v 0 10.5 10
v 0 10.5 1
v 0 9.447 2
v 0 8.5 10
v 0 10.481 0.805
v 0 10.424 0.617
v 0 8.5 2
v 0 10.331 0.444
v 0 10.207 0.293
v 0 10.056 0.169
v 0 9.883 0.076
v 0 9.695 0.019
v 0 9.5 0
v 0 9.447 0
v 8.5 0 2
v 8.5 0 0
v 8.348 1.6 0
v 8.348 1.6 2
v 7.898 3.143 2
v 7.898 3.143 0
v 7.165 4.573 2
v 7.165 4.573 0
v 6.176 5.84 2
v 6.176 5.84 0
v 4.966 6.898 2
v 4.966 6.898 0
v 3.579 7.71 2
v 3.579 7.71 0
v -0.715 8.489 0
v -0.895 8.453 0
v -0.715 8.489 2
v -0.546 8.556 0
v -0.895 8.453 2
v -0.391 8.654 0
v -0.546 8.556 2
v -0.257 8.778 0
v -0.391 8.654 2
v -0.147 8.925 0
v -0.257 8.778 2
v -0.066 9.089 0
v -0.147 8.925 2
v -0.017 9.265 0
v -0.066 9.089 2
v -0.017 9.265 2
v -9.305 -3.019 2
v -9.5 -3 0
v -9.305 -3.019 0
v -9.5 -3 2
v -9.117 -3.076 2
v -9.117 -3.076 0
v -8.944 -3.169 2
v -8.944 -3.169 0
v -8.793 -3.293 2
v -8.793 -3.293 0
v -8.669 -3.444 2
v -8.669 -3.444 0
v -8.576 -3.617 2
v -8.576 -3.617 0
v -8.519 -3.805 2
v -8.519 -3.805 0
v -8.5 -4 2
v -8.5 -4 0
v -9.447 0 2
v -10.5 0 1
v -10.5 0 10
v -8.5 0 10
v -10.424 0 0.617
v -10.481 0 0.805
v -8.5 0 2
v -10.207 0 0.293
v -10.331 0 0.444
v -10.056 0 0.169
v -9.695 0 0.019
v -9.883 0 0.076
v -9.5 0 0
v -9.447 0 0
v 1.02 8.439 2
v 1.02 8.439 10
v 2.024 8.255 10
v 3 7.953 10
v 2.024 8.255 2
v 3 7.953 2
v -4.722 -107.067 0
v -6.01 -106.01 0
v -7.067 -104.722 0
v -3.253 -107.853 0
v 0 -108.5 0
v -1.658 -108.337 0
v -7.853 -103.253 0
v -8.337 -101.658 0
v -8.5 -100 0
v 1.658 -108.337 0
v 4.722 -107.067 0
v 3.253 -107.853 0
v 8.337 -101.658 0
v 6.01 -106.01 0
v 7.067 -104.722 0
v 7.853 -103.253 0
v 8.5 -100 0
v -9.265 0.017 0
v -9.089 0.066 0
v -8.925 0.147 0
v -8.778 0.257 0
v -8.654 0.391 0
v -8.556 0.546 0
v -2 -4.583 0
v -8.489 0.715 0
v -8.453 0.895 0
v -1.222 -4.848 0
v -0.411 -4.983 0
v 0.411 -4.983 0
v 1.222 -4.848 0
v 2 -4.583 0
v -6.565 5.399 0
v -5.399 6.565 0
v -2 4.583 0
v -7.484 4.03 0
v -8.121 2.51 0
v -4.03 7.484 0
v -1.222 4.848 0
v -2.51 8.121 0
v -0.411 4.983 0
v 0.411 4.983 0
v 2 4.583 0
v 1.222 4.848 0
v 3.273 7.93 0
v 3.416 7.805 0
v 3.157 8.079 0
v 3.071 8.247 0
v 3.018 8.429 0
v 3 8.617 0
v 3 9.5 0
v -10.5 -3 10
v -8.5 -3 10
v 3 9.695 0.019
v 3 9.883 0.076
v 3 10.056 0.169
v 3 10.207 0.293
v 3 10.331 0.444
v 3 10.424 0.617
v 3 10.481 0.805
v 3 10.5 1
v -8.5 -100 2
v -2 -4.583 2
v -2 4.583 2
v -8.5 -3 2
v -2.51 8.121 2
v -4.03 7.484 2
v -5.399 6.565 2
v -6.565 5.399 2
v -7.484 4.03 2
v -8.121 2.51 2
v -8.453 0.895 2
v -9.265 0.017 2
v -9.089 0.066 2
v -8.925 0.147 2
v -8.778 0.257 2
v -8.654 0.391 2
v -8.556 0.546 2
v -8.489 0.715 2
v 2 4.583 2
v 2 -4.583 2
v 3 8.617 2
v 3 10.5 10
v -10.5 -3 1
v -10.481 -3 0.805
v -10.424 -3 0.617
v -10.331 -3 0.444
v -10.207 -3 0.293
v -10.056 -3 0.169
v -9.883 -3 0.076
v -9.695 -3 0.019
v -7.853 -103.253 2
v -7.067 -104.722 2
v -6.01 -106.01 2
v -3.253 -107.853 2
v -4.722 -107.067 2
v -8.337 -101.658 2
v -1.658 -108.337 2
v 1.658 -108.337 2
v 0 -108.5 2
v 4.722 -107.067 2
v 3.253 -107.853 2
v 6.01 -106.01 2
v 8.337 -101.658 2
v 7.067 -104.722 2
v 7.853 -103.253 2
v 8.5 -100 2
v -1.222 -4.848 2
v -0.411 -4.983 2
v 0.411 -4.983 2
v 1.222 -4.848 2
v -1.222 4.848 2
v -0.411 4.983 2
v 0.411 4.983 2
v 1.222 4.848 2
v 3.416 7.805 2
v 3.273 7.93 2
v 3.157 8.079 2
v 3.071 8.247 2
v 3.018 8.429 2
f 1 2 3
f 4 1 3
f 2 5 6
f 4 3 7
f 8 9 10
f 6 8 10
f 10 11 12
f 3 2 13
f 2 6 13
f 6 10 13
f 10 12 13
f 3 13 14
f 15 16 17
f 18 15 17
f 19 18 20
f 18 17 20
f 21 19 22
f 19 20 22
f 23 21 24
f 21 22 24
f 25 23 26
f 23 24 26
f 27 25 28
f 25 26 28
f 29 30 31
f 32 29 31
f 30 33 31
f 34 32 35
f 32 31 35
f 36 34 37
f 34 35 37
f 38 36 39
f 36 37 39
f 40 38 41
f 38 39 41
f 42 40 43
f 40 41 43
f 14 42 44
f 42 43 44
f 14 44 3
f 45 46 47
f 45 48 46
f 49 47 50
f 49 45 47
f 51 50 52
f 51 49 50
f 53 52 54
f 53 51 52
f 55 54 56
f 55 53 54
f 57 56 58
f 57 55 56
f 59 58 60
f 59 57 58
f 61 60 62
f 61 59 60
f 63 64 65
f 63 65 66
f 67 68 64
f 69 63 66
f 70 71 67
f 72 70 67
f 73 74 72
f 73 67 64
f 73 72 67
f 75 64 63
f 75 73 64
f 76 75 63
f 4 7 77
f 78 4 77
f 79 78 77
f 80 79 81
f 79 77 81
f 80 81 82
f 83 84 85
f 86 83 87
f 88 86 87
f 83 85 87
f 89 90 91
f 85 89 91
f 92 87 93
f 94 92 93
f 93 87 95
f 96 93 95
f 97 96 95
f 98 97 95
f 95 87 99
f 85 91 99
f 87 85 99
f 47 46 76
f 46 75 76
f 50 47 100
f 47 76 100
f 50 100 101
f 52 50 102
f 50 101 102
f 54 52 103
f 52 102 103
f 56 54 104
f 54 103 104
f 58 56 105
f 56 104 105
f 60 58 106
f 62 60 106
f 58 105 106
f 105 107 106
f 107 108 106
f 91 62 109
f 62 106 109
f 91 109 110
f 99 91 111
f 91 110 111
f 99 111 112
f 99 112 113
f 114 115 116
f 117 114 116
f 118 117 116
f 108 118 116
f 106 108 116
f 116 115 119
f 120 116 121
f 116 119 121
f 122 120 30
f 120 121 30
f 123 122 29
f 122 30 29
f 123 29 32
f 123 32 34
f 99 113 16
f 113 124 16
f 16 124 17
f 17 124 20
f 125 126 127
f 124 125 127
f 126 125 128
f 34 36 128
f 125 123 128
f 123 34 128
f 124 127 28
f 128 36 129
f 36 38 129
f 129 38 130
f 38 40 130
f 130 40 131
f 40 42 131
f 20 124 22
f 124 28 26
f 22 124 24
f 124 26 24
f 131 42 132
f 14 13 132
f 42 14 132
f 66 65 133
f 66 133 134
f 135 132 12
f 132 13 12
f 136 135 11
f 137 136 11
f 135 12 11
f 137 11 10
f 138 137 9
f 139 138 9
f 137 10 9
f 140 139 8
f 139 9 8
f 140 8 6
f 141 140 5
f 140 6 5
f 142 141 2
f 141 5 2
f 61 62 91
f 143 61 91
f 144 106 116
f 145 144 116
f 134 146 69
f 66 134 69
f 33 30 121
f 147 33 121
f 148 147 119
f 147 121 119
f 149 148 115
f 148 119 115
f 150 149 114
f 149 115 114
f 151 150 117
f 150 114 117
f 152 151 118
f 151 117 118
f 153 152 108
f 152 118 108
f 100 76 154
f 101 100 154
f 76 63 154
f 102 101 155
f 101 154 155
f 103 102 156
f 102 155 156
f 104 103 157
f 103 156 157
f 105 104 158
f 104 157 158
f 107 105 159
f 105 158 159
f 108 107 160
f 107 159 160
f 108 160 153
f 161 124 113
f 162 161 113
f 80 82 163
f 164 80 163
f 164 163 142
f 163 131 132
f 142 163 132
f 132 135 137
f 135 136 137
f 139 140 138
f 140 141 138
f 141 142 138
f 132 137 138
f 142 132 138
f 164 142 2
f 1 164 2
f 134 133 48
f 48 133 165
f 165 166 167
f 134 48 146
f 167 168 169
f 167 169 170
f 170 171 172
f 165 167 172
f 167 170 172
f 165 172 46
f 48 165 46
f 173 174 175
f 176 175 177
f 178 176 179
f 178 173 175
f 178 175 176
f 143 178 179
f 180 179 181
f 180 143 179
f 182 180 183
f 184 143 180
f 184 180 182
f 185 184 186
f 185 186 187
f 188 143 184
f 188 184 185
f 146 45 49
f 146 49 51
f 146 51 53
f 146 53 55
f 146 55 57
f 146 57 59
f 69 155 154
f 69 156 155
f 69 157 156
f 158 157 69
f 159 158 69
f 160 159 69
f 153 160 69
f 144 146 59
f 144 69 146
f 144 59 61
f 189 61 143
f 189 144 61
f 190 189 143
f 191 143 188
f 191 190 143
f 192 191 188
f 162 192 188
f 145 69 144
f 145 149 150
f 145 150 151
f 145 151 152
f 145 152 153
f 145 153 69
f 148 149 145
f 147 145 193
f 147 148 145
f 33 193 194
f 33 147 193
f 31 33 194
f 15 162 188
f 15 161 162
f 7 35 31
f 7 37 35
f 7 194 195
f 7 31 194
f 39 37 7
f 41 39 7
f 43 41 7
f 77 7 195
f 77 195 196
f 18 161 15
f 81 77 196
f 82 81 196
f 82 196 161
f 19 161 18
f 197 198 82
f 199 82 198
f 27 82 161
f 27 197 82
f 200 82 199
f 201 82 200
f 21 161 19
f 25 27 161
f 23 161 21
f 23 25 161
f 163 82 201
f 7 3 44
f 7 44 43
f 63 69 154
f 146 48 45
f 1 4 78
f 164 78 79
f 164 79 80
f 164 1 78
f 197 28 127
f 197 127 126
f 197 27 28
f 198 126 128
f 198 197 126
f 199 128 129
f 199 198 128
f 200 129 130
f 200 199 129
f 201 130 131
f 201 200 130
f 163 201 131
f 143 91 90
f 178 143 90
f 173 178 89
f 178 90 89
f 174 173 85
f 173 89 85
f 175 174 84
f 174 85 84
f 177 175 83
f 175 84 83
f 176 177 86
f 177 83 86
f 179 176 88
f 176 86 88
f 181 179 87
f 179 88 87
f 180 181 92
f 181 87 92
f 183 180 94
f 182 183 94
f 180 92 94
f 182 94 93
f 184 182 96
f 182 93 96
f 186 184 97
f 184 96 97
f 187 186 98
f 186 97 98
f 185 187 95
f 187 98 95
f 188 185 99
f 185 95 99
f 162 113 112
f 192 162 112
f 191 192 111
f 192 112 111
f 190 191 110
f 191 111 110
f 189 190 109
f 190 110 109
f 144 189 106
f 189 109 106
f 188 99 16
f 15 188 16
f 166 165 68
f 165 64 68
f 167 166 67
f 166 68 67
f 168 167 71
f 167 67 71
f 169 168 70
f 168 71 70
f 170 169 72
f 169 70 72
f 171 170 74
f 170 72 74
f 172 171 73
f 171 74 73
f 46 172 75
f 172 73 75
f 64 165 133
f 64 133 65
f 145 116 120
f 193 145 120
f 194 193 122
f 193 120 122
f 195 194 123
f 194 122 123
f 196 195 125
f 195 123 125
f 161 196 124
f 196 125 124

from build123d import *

# Parameters (mm, degrees)
F1_DEPTH = 2
F2_W     = 2
F2_H     = 3
F3_DEPTH = 10
F4_R     = 0.99999


# Not quite as in the source:
# - a fillet or chamfer is up to 0.001 mm smaller than in the source, because OpenCascade refuses the exact size


with BuildPart() as f1:
    # F0 (on Top) → F1 (new body)
    with BuildSketch(Plane.XY):
        with BuildLine():
            Line((8.5, -100), (8.5, 0))
            ThreePointArc((8.5, 0), (0, 8.5), (-8.5, 0))
            Line((-8.5, 0), (-8.5, -100))
            ThreePointArc((-8.5, -100), (0, -108.5), (8.5, -100))
        make_face()
        with BuildLine():
            ThreePointArc((-2, 4.582575695), (0, 5), (2, 4.582575695))
            Line((2, 4.582575695), (2, -4.582575695))
            ThreePointArc((2, -4.582575695), (0, -5), (-2, -4.582575695))
            Line((-2, -4.582575695), (-2, 4.582575695))
        make_face(mode=Mode.SUBTRACT)
    extrude(amount=F1_DEPTH)

    # F2 (on Top) → F3 (join)
    with BuildSketch(Plane.XY):
        with Locations((-9.5, -1.5)):
            Rectangle(F2_W, F2_H)
        with BuildLine():
            Line((0, 10.5), (0, 8.5))
            ThreePointArc((0, 8.5), (1.5247314005, 8.3621285661), (3, 7.9529868603))
            Line((3, 7.9529868603), (3, 10.5))
            Line((3, 10.5), (0, 10.5))
        make_face()
    extrude(amount=F3_DEPTH)

    # F4 (radius 1 in the source; OpenCascade refuses exactly that, so slightly less here)
    f4_edges = [f1.edges().sort_by_distance(p)[0] for p in [
        (-8.5, 0, 1),
        (0, 8.5, 1),
        (-8.5, -3, 1),
        (-10.5, -1.5, 0),
        (1.5, 10.5, 0),
        (3, 7.952987, 1),
    ]]
    fillet(f4_edges, radius=F4_R)


solid = f1.part
